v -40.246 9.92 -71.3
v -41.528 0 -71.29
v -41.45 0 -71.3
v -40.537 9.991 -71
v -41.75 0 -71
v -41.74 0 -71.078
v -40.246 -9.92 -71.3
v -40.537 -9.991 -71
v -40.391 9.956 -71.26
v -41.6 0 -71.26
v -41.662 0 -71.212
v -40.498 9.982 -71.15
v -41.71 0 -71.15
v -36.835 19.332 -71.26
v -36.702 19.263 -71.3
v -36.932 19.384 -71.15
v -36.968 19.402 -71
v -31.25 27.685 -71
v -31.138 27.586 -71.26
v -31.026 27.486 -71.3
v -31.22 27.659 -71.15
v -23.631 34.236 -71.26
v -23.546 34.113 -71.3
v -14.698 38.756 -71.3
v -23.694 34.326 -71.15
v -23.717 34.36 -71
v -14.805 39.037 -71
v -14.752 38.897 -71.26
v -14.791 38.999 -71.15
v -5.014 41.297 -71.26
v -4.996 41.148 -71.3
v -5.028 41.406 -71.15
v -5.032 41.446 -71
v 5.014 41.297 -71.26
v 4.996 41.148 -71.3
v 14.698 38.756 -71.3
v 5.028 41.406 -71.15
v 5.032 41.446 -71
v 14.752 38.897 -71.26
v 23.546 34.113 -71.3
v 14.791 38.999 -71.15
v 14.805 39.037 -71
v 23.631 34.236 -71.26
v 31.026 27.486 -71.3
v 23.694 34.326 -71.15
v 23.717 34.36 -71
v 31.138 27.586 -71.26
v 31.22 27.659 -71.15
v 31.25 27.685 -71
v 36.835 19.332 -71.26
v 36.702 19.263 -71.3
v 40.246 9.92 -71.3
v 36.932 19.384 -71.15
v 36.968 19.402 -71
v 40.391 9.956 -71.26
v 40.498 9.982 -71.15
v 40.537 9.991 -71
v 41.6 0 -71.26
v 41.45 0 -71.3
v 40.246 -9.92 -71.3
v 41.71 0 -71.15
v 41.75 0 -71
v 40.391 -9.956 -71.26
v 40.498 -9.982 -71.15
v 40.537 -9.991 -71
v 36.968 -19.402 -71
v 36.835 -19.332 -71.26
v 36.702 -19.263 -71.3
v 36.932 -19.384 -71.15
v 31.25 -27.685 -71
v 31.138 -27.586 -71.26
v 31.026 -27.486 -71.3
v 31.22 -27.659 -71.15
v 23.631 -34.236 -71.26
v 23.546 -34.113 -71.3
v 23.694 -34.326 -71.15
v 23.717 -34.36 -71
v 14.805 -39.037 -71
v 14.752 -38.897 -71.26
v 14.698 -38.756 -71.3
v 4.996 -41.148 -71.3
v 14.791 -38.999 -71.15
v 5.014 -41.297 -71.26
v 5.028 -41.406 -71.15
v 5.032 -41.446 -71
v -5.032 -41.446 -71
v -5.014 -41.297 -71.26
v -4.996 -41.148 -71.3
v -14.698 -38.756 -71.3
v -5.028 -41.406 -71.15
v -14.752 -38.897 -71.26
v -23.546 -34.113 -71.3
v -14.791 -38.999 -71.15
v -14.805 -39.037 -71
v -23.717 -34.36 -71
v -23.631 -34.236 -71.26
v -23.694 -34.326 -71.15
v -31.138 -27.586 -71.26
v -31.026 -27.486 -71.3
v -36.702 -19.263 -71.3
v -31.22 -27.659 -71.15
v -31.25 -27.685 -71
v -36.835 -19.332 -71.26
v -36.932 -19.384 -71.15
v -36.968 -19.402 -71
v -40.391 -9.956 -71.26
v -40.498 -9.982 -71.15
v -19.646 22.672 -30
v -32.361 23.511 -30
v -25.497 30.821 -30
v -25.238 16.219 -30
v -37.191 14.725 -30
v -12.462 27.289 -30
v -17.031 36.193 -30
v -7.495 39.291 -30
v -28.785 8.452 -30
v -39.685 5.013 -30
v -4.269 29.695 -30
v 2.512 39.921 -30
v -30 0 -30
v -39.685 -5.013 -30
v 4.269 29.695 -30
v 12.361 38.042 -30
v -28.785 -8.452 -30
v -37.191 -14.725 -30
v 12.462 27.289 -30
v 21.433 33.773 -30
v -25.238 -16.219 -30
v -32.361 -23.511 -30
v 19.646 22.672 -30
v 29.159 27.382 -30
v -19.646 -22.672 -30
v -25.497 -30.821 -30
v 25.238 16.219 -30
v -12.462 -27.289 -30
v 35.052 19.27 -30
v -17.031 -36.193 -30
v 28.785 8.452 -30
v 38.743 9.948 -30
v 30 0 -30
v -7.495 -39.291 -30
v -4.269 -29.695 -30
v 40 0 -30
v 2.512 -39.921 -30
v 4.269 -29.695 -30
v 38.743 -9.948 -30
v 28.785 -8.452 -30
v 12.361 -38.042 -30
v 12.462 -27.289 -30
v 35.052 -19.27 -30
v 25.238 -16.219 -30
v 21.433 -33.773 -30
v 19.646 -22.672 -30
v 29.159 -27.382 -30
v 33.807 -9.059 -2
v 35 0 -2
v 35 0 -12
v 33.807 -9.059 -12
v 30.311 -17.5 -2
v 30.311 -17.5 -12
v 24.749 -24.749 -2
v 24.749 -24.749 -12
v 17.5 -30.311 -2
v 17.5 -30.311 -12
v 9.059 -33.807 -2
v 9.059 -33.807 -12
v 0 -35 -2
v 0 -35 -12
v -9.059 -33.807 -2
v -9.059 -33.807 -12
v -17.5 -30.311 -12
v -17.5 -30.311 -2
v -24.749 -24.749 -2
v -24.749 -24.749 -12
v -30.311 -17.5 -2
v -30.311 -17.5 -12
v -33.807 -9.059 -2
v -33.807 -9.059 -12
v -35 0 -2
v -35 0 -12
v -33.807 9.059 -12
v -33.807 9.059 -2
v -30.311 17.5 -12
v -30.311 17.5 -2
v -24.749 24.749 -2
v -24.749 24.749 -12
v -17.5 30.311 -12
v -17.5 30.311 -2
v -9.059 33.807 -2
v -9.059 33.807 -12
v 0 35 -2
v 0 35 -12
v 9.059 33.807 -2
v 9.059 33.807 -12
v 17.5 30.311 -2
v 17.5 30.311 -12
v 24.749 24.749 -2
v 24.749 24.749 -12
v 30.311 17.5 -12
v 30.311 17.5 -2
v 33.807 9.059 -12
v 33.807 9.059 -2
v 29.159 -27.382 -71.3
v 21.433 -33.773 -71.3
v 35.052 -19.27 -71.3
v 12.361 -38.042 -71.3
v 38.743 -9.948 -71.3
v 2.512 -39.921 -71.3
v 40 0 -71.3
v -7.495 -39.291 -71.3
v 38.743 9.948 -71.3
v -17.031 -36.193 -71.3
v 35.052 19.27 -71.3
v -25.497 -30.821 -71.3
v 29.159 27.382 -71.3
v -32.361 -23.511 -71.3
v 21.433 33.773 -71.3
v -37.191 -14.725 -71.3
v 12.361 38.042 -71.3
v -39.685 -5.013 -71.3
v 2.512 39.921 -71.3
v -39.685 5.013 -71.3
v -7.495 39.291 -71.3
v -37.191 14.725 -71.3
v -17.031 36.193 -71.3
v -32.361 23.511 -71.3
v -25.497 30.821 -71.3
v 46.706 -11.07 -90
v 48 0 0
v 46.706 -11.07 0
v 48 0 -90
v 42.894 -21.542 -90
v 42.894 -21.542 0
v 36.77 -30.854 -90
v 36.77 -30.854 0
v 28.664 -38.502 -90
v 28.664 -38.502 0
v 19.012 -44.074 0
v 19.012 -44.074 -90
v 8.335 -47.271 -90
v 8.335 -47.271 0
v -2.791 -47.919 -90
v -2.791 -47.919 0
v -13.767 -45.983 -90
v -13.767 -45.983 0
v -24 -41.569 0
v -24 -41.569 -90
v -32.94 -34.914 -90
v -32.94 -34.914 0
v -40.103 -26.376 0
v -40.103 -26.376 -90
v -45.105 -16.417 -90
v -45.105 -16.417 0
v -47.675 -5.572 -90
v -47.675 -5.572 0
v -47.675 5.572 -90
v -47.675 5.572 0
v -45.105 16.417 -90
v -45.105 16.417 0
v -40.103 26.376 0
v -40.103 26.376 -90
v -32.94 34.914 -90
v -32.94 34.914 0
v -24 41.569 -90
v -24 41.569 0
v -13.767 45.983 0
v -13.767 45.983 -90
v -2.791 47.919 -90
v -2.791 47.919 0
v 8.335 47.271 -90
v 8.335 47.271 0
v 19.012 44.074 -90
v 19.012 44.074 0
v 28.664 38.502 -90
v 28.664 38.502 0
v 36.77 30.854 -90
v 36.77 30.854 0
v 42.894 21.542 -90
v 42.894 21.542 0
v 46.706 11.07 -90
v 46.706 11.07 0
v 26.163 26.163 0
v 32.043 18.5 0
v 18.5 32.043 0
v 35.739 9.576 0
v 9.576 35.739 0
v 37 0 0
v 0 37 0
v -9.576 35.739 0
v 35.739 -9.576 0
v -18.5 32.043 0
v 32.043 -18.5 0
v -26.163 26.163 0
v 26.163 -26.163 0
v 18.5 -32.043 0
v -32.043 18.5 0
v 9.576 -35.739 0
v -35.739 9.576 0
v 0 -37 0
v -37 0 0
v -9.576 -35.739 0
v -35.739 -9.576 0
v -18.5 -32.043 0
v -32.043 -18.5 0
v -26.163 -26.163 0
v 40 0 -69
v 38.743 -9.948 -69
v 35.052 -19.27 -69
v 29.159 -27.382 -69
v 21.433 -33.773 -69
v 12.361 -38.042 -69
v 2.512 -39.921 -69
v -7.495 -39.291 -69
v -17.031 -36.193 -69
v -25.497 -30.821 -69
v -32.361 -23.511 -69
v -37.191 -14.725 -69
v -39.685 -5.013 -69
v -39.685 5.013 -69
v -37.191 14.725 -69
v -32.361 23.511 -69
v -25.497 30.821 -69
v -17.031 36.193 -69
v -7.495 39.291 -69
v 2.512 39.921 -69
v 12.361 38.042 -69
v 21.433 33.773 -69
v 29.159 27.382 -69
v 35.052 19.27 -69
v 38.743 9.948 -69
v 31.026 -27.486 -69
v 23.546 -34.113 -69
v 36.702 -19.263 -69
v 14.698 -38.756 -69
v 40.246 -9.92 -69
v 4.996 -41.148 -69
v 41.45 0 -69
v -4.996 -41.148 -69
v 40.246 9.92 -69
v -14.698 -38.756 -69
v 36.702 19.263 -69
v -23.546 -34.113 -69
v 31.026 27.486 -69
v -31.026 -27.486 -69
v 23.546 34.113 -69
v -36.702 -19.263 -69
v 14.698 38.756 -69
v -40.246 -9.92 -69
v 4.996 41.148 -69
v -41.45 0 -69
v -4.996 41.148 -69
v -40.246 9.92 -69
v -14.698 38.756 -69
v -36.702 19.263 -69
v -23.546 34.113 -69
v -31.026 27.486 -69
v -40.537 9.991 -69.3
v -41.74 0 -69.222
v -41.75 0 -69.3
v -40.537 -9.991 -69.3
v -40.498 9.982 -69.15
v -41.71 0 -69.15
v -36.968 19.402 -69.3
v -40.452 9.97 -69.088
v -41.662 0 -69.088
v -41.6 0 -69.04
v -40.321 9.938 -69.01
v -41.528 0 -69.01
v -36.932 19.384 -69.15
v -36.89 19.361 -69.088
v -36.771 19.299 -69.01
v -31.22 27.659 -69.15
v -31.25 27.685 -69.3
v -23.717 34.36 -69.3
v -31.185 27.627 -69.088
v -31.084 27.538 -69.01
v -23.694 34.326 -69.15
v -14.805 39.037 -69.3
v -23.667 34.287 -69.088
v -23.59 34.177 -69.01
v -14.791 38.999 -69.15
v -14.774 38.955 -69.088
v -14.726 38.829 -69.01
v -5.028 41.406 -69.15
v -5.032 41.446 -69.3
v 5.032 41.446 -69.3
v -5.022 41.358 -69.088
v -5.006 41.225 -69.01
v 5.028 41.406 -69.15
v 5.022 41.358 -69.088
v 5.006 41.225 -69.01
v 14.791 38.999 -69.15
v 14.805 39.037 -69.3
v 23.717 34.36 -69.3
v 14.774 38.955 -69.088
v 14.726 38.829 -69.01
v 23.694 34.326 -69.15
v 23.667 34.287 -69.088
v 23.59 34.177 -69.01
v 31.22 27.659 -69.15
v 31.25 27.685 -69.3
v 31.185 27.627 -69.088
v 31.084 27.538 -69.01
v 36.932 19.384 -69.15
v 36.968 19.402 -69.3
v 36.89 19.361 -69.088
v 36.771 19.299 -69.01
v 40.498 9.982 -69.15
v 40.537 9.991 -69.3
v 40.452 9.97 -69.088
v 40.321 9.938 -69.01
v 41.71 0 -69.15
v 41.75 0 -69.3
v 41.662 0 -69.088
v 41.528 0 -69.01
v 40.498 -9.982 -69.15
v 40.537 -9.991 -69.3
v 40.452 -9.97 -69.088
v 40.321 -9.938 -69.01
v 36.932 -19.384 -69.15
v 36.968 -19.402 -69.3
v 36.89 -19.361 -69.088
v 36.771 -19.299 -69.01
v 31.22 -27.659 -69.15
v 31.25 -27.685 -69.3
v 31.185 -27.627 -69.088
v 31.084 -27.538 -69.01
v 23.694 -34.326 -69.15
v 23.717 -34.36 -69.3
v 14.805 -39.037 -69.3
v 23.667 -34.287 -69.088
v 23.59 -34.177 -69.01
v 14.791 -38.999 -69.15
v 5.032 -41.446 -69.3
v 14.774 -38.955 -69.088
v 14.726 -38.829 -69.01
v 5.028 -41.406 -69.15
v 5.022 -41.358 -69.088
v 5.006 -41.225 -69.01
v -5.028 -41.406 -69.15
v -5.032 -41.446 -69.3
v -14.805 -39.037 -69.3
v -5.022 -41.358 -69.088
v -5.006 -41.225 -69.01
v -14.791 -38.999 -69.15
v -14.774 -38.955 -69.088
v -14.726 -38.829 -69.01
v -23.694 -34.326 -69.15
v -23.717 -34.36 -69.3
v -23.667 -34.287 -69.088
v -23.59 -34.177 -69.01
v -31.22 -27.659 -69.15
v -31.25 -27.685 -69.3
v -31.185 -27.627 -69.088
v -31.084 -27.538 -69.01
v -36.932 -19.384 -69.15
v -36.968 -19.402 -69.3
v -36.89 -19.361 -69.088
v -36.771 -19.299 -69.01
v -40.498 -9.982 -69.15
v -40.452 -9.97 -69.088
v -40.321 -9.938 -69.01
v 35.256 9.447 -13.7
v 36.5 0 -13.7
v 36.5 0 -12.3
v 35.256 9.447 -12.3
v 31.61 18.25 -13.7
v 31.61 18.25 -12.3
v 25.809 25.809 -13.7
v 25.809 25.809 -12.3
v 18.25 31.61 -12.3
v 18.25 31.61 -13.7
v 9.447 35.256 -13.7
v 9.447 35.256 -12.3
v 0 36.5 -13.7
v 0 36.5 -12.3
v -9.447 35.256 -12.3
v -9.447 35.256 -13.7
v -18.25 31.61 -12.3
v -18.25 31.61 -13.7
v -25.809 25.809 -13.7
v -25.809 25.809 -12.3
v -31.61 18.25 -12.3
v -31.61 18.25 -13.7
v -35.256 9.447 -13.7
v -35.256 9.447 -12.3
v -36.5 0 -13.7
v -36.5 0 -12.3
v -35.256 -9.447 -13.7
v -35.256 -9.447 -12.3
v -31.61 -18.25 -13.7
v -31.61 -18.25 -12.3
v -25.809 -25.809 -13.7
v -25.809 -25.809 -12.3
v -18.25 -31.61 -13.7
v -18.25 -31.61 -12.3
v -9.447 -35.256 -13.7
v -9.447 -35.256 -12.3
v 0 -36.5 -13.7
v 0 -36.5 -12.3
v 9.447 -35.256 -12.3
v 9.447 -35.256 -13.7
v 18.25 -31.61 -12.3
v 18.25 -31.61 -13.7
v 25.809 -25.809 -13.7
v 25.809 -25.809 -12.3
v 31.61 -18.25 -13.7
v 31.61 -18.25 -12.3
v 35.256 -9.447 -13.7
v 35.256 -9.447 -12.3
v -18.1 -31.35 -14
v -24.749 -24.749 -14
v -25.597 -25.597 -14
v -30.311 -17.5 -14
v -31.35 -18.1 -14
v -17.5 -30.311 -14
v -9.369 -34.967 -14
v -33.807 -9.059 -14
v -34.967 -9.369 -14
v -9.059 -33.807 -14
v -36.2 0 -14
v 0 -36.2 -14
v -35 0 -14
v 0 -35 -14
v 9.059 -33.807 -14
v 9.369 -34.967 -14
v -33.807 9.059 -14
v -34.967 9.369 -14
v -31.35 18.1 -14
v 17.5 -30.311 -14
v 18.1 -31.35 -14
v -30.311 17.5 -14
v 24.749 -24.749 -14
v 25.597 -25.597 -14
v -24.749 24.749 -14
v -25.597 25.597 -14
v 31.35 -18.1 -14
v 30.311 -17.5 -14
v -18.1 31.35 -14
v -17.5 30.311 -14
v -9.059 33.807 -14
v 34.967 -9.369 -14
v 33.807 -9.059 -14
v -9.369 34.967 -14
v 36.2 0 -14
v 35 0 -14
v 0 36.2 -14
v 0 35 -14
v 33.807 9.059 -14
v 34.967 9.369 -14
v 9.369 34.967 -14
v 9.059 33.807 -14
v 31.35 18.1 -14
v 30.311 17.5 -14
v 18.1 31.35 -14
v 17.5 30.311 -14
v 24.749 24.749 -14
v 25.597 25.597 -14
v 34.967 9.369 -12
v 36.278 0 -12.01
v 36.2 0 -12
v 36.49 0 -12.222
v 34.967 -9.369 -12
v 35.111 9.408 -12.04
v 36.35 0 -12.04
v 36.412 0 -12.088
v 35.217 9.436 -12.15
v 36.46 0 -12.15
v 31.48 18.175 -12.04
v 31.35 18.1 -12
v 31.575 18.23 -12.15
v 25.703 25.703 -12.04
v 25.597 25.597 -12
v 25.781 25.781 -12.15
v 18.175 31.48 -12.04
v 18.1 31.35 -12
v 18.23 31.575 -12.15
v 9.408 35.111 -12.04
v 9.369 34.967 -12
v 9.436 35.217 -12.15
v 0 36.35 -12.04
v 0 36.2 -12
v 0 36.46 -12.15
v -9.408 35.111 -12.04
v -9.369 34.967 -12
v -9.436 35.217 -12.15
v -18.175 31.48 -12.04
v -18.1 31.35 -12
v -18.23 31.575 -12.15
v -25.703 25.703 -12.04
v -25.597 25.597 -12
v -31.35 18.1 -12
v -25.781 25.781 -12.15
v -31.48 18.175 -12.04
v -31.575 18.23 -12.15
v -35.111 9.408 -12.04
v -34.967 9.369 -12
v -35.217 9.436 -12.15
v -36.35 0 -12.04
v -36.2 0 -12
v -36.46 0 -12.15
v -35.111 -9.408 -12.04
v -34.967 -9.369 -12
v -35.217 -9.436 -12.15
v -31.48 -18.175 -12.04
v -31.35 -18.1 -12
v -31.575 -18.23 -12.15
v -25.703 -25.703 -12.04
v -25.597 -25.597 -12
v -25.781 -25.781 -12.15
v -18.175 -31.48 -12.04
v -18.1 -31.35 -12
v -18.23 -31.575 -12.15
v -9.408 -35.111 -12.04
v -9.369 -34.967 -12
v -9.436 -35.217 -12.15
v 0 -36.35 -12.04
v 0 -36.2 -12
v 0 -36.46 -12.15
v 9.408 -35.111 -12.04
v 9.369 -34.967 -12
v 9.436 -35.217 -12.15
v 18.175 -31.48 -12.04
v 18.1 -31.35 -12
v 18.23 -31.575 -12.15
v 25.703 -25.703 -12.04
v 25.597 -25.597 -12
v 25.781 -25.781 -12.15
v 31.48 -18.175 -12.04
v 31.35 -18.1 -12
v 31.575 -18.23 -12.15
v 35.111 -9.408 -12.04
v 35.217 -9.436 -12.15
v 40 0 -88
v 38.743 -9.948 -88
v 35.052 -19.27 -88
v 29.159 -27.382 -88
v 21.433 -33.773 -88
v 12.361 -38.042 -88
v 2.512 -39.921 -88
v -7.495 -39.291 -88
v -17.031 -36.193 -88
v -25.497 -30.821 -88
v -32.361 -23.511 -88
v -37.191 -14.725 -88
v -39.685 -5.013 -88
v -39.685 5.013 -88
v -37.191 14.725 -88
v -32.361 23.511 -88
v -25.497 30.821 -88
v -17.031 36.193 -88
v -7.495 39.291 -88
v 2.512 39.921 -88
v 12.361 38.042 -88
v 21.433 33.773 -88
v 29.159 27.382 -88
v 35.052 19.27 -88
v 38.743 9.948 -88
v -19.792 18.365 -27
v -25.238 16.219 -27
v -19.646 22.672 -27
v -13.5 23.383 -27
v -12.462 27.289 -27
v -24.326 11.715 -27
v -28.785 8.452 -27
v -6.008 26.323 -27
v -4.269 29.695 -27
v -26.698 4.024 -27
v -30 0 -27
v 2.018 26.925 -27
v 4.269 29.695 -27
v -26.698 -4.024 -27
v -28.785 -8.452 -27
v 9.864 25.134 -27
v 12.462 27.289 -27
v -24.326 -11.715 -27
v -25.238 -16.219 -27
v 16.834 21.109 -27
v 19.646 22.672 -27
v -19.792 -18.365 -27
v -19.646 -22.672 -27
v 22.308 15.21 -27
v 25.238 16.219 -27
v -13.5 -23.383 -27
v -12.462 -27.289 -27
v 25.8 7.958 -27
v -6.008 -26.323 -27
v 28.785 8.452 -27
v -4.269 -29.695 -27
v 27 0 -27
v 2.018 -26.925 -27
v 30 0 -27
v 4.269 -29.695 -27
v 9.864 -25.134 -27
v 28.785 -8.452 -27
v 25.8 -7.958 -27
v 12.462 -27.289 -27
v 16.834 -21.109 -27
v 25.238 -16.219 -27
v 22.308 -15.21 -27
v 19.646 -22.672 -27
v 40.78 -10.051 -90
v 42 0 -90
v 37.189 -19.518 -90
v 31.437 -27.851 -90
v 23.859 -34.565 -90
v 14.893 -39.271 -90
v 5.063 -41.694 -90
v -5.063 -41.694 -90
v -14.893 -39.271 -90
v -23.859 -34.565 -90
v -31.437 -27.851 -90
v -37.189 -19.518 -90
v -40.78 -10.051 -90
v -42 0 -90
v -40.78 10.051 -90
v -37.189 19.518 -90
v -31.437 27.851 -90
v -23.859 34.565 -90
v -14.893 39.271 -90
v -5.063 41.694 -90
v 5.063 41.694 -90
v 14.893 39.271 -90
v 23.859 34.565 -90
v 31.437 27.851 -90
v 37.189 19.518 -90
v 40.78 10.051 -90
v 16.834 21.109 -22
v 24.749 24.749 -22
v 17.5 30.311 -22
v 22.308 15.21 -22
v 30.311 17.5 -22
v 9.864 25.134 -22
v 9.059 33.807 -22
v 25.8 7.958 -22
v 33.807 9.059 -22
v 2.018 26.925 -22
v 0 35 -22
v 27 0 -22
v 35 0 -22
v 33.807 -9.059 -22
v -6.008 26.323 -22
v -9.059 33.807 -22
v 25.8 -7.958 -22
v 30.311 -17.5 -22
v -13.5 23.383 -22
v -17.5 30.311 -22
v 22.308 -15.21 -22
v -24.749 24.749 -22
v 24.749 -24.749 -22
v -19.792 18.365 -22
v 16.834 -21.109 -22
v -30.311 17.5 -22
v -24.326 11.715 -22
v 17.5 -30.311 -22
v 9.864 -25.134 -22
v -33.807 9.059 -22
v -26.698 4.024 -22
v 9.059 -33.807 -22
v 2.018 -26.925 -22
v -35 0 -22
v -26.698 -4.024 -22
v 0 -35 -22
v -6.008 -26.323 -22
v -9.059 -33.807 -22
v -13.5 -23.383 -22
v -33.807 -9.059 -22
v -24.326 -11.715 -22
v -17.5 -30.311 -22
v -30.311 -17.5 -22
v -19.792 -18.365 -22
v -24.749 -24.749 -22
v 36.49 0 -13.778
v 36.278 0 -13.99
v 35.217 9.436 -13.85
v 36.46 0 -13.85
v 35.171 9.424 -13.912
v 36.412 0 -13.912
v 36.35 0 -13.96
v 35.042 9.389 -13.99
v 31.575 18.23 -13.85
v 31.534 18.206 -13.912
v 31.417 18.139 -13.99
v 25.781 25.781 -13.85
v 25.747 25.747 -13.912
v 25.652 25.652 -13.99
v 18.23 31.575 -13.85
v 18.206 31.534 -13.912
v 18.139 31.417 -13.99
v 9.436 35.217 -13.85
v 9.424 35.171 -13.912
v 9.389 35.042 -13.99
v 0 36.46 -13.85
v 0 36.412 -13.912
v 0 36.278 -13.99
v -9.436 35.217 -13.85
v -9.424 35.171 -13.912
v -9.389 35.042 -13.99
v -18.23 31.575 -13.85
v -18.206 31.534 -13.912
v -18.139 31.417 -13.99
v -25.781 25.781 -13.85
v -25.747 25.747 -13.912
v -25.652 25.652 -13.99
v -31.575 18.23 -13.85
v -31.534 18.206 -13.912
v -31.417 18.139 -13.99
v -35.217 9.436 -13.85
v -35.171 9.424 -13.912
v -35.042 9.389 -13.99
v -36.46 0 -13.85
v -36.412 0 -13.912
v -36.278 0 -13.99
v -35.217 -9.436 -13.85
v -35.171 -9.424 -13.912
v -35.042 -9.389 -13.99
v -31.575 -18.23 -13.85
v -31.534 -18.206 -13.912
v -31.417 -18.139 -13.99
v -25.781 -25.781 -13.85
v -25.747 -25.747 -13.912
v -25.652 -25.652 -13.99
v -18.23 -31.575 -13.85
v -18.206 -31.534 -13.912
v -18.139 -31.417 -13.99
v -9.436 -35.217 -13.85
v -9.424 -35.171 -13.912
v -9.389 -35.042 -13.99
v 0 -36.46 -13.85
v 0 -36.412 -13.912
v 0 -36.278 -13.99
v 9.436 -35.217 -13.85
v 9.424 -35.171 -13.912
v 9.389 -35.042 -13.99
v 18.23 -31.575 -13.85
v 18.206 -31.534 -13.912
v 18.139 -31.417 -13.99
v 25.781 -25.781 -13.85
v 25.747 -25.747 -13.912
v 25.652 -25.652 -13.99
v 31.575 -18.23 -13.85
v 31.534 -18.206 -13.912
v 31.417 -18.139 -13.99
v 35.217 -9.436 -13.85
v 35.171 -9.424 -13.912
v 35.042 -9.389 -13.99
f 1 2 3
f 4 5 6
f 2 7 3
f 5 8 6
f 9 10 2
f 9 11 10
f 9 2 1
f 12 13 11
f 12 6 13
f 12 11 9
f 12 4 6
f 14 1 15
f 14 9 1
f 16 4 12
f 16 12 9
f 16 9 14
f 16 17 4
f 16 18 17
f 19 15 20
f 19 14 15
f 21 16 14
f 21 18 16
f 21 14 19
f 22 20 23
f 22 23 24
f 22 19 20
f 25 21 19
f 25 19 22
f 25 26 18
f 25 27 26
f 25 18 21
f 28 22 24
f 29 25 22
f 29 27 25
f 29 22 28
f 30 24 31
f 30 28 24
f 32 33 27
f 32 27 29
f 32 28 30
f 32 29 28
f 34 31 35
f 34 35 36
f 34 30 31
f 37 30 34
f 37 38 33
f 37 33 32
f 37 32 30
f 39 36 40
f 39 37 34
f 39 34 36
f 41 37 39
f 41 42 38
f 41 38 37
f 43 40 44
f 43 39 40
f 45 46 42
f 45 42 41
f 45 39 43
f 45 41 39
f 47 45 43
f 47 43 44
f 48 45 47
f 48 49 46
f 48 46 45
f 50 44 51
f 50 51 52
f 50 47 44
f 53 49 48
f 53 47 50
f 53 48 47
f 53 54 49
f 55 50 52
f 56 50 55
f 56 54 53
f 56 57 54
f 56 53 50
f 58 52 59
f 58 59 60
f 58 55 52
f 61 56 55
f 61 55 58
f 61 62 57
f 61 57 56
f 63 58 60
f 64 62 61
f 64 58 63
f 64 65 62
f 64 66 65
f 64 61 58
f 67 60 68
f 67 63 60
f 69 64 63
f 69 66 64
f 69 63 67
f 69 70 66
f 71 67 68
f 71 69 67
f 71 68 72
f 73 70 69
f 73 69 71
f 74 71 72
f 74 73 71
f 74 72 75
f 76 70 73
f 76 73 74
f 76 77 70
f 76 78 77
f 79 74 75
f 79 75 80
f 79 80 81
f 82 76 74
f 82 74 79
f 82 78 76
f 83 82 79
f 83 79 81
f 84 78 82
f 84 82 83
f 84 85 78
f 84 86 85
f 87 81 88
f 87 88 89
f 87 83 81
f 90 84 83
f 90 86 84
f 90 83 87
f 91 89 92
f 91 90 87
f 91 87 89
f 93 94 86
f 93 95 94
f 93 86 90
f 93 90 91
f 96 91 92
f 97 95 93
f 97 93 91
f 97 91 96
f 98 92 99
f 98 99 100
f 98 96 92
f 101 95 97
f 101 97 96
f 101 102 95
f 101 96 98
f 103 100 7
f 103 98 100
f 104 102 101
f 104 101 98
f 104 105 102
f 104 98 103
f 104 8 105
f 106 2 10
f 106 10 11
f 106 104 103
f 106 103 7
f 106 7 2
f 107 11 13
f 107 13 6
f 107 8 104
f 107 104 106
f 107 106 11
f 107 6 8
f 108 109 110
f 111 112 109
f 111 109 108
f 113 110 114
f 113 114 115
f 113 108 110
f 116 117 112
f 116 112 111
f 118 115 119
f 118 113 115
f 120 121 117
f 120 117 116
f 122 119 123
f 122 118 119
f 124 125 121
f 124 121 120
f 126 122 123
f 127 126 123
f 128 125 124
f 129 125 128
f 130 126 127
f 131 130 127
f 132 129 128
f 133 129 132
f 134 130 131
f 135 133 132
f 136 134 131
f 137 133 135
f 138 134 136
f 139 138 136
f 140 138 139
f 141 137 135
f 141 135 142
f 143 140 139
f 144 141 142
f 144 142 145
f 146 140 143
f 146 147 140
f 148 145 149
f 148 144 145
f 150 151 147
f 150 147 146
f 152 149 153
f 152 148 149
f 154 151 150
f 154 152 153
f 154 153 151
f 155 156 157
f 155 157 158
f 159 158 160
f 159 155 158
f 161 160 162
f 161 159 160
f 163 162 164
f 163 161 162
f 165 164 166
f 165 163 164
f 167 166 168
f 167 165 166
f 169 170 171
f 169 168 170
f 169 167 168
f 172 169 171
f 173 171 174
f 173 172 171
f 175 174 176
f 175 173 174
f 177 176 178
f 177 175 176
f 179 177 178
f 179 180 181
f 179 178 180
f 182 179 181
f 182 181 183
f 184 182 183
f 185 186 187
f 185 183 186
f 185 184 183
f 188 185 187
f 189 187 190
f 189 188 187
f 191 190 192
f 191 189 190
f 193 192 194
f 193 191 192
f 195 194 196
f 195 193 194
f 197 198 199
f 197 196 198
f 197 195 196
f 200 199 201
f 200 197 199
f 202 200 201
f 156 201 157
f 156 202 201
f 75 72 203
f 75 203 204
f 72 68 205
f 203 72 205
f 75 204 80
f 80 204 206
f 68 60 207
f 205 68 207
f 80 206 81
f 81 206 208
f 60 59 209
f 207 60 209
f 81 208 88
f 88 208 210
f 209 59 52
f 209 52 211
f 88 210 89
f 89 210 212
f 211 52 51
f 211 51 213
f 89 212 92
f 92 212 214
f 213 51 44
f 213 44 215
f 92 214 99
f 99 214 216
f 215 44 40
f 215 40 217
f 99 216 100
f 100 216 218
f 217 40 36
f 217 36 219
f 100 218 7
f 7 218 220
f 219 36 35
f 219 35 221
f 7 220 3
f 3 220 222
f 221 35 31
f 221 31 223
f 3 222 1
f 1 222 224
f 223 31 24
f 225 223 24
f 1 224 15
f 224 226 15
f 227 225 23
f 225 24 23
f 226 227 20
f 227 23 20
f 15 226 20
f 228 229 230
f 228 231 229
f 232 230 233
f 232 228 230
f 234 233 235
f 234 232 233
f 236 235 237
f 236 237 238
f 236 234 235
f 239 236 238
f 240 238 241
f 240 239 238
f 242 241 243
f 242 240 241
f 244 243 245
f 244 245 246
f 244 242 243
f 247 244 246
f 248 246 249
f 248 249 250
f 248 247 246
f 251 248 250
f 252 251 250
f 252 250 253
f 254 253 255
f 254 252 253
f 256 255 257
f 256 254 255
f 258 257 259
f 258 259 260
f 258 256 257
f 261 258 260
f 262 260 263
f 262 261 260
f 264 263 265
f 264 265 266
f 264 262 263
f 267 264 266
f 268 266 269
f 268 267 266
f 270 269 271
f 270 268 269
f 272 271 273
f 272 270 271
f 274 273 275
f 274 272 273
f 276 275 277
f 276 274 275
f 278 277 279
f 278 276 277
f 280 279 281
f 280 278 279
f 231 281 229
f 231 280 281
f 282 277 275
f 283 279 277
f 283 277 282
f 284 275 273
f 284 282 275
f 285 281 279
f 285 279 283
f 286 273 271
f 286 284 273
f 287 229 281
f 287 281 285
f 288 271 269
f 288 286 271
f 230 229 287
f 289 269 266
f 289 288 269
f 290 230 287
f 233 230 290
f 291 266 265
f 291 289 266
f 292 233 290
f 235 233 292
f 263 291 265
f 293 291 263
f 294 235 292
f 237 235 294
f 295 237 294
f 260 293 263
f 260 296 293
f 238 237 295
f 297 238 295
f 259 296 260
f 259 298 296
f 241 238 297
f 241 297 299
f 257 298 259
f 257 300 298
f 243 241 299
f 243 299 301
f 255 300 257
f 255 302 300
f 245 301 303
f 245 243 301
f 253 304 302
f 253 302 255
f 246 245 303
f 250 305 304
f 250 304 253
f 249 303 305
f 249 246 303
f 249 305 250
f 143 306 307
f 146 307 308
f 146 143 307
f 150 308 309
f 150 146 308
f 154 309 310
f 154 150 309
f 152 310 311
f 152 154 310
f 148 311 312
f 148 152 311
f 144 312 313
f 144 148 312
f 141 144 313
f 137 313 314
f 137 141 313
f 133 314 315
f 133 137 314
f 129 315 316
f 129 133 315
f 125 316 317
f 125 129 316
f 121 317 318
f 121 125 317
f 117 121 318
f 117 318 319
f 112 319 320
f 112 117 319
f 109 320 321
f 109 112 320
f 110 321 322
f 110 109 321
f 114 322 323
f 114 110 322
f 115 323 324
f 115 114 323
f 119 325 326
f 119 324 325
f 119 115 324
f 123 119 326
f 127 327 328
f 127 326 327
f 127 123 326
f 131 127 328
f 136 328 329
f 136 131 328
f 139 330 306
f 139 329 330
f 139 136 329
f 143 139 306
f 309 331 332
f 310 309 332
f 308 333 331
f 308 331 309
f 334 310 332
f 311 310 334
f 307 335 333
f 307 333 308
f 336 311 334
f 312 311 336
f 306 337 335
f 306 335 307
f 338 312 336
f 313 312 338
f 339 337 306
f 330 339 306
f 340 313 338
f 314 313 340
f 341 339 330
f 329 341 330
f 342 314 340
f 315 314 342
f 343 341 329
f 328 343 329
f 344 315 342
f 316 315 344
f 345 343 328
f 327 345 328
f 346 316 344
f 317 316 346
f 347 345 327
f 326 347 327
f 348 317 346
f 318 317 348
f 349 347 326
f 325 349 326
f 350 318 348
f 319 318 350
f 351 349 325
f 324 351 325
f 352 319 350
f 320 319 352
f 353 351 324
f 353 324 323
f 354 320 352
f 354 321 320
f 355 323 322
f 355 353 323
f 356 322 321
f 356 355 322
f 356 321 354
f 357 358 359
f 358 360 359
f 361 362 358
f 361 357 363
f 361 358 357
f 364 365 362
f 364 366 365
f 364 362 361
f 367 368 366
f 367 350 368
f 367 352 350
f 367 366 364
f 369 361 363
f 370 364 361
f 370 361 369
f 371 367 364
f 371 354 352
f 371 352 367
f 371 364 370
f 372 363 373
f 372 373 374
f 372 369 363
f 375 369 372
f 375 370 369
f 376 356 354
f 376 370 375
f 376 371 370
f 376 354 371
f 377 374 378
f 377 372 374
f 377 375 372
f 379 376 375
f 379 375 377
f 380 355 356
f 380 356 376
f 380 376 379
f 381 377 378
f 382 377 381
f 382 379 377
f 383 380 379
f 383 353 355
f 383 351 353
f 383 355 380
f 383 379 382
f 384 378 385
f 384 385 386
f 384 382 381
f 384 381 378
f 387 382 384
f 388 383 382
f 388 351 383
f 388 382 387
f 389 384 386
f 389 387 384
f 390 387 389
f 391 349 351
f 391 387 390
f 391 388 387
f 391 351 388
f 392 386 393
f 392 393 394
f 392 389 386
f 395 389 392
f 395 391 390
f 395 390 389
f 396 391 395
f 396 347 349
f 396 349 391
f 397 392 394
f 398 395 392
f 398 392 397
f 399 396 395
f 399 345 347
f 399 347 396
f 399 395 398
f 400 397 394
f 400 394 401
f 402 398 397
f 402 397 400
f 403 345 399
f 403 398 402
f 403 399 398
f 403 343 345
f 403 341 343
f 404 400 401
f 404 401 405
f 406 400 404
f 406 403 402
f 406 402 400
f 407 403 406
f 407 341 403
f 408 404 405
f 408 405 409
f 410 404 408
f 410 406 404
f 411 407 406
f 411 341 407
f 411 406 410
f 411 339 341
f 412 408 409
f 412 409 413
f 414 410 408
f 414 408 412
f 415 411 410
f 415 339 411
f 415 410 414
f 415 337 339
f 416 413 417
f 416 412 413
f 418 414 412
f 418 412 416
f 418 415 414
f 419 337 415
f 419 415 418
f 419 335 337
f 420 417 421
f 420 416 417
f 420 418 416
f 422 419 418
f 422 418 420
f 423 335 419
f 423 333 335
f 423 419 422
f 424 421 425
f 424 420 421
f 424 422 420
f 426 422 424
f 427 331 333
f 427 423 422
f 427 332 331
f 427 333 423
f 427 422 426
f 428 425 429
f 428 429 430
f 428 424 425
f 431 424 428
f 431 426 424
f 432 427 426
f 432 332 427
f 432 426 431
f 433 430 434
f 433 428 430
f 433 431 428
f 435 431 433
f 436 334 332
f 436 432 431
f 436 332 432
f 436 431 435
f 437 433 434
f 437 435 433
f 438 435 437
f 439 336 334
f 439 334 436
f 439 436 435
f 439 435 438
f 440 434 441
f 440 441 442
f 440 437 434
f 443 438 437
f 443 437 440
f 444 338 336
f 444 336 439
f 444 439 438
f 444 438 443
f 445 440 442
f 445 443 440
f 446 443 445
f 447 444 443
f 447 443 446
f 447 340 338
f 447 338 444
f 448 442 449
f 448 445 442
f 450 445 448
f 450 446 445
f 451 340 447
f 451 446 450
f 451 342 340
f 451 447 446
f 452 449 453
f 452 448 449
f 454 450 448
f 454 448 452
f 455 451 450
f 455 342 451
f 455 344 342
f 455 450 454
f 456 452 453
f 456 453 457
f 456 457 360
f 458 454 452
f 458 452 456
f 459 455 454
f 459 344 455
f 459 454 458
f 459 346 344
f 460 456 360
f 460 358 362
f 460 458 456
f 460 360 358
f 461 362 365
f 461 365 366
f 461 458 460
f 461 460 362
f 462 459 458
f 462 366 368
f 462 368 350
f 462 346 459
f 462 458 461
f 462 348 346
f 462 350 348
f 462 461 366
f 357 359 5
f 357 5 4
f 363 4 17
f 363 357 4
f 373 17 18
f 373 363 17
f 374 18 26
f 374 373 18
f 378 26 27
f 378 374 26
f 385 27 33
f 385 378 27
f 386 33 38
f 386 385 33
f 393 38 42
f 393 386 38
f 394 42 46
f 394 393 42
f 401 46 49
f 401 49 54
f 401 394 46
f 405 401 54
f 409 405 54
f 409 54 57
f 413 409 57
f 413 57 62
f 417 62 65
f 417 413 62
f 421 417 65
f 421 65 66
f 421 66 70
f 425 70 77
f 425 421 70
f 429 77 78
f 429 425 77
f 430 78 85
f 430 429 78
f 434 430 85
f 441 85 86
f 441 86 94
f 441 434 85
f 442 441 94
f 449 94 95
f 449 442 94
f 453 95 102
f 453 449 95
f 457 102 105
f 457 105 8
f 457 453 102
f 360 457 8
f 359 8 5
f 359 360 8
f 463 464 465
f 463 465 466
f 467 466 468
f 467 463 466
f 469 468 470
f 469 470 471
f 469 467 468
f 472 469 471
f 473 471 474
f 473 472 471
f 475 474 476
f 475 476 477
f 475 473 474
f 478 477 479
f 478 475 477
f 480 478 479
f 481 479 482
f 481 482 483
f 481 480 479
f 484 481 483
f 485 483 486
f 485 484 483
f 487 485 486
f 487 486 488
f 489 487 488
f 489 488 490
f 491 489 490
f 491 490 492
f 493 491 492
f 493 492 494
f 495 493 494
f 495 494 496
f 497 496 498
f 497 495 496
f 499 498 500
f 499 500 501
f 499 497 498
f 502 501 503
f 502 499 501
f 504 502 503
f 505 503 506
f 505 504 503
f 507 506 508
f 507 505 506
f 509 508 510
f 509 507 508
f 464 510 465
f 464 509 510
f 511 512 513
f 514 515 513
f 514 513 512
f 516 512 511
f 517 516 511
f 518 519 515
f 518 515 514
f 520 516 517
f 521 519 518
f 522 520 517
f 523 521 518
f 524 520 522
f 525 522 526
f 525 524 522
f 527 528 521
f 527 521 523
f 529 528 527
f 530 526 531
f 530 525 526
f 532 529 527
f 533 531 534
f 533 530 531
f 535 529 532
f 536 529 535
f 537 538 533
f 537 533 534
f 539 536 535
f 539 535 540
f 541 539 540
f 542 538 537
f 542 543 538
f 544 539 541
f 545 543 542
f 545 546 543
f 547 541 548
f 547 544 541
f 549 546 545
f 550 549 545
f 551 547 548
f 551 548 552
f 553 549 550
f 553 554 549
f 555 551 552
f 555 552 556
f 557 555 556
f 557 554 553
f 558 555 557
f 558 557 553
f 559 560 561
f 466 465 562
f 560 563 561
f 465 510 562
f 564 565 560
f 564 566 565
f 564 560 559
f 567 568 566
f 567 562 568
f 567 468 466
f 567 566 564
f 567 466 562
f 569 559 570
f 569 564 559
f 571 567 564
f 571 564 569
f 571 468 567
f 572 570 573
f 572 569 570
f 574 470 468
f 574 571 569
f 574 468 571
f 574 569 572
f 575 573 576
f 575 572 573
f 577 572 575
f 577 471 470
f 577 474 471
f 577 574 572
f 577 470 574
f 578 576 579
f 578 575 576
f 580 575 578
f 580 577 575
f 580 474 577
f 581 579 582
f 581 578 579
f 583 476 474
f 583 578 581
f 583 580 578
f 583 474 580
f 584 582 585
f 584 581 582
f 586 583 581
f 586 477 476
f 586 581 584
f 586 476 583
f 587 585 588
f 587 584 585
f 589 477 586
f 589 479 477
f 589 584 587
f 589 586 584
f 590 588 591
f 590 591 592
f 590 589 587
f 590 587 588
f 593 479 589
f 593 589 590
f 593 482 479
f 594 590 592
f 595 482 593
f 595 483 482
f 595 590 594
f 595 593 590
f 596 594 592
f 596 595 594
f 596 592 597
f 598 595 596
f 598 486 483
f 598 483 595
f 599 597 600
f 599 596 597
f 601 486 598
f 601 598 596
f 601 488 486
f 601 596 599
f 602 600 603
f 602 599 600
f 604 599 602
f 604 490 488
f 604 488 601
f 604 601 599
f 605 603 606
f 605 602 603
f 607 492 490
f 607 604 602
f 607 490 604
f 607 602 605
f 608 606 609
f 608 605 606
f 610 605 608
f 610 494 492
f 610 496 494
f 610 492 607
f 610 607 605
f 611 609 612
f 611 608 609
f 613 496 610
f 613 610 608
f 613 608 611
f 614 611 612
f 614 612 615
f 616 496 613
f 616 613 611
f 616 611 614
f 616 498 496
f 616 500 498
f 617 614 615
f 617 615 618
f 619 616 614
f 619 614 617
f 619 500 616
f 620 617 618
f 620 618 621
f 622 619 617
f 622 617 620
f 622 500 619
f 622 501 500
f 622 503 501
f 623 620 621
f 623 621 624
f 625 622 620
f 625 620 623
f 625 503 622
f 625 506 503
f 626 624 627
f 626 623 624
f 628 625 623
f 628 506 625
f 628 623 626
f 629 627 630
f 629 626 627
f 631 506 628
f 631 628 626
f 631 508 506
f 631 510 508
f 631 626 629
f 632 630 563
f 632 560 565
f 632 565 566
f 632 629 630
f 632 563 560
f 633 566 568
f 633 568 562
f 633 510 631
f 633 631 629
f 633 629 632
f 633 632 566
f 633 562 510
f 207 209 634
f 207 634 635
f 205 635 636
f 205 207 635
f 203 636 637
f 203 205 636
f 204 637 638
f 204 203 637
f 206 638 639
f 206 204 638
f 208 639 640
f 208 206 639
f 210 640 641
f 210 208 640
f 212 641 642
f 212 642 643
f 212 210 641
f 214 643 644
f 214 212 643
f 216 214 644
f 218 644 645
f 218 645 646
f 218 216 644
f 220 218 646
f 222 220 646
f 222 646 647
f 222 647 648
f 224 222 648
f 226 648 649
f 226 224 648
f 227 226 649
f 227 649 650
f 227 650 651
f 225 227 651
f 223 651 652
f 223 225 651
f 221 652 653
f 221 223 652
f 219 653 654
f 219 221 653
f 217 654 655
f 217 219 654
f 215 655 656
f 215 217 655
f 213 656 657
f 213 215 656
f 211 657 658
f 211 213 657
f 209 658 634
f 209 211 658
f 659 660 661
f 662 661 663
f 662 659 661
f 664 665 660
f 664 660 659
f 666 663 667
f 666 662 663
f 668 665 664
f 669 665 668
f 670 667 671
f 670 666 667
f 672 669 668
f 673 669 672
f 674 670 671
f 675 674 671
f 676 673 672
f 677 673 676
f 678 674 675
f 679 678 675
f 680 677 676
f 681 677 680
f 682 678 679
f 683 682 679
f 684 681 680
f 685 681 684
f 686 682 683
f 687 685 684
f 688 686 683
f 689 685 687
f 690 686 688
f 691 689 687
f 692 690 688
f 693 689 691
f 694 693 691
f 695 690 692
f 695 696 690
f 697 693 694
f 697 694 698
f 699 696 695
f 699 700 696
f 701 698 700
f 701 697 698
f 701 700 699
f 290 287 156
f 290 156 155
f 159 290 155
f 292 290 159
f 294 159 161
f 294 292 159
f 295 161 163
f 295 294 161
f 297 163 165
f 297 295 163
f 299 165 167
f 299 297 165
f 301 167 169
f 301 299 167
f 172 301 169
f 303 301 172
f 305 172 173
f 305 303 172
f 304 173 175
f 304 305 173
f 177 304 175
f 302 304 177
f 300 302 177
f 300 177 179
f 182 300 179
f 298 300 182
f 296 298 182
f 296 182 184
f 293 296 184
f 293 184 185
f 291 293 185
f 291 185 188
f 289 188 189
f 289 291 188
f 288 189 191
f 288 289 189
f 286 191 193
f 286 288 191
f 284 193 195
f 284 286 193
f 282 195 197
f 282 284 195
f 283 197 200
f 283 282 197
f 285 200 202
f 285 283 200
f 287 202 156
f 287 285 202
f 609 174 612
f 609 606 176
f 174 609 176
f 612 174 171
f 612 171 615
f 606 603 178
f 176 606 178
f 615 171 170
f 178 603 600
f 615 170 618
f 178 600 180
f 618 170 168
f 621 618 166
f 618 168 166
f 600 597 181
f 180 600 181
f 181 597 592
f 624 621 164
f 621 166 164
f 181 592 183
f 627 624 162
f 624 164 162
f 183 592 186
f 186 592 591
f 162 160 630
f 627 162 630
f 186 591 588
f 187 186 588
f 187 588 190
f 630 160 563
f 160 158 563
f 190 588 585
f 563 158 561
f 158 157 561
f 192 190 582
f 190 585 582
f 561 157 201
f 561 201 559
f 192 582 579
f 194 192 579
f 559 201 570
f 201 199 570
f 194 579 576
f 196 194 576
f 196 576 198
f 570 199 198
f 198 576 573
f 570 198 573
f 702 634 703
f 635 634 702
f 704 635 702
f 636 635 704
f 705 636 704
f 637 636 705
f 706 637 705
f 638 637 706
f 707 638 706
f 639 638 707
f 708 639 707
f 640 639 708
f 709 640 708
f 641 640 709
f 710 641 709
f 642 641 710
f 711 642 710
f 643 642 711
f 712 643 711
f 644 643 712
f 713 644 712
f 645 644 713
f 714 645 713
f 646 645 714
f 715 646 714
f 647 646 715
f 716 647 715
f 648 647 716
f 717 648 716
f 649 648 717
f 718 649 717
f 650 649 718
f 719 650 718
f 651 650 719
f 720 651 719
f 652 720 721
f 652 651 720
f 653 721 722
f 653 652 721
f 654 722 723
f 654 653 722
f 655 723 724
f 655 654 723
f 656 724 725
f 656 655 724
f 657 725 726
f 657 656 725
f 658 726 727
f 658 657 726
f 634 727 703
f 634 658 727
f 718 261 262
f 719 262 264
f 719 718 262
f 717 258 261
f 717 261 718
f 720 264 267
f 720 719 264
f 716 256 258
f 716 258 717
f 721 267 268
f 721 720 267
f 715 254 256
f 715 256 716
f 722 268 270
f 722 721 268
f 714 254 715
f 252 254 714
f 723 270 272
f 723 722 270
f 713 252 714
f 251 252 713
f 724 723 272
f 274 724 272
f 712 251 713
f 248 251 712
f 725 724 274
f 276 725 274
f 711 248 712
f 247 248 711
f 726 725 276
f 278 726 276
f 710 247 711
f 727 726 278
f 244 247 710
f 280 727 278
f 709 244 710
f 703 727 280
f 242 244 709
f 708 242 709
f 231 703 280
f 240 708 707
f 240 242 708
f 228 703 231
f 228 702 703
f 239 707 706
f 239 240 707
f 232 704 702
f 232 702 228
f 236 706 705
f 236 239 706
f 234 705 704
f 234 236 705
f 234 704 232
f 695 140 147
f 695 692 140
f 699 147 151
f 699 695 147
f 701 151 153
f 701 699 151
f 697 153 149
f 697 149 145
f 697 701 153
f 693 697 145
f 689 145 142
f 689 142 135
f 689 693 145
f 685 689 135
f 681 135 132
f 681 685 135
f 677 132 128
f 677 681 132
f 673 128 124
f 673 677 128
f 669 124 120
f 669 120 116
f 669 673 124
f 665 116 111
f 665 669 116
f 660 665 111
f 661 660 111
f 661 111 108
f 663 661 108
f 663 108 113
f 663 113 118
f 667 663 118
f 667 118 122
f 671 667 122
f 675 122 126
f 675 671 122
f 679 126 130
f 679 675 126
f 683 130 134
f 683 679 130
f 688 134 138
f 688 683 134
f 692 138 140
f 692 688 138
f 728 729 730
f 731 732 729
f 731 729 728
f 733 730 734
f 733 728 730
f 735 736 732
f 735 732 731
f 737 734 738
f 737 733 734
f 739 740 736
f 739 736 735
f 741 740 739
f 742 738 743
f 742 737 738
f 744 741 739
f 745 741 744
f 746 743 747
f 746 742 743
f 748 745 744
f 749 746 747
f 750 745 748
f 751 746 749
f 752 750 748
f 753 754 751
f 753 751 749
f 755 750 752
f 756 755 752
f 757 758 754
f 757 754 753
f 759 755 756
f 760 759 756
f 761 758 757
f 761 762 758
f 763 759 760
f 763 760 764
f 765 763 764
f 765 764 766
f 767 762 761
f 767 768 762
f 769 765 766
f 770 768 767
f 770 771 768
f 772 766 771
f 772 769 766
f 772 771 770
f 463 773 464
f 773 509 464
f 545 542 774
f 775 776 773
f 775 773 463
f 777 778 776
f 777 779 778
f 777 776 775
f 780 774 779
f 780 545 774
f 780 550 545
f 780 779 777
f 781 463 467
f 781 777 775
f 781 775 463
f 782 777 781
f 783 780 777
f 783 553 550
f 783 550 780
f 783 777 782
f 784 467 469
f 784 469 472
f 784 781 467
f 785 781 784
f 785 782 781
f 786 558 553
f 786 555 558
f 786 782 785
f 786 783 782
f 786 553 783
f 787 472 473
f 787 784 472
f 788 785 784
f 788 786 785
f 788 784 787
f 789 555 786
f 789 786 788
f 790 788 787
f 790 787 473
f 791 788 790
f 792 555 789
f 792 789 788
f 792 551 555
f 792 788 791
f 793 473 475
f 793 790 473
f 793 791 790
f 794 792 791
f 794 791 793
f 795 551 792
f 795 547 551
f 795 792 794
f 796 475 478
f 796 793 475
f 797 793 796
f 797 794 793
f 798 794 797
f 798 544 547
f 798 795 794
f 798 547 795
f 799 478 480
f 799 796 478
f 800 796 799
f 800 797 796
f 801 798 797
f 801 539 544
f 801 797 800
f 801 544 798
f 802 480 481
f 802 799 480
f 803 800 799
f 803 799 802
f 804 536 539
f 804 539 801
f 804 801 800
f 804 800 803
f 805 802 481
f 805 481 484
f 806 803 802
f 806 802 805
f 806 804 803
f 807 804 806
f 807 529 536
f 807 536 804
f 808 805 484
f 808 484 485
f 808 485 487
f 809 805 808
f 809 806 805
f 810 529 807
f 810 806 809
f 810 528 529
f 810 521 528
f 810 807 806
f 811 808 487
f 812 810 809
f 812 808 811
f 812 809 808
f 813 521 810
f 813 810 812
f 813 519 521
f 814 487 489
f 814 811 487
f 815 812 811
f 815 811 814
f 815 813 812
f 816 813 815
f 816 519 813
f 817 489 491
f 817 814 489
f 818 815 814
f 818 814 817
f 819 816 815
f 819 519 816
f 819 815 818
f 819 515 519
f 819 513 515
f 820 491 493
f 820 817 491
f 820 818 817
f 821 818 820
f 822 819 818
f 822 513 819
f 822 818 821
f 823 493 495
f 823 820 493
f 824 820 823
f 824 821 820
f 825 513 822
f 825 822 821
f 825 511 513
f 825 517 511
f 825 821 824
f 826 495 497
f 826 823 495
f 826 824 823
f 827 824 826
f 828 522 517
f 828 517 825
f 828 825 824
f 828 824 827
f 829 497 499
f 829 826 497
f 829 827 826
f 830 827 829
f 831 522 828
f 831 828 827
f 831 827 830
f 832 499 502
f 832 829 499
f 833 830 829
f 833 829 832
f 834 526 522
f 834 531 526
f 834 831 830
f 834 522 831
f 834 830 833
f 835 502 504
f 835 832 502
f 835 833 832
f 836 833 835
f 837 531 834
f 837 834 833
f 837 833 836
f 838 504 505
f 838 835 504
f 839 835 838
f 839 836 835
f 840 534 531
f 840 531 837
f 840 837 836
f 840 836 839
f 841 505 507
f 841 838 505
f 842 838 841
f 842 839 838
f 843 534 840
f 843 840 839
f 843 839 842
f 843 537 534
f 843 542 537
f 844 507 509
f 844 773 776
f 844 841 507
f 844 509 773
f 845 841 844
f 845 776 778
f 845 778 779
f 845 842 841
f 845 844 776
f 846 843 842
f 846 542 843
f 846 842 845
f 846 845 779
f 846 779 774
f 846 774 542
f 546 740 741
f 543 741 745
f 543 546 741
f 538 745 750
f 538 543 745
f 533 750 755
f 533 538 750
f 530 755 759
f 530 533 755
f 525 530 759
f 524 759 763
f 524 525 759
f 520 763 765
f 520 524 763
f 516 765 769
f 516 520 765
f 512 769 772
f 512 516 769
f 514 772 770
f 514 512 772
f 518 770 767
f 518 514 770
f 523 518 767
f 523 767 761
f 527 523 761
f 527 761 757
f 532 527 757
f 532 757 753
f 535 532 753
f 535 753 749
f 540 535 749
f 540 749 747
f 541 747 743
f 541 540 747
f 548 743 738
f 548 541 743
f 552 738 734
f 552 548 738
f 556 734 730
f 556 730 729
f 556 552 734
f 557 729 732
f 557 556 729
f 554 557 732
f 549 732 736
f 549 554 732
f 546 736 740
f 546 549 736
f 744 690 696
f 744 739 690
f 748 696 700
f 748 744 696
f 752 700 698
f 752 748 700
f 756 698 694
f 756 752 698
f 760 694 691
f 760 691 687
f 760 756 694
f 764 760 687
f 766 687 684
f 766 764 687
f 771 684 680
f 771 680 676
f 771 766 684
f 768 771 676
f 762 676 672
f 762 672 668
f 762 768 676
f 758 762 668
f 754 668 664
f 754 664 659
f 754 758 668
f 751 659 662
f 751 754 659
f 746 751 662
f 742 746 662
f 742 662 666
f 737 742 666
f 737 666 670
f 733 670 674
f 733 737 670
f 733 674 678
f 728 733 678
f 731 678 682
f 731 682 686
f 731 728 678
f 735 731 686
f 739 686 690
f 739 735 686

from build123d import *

# Parameters (mm, degrees)
SKETCH_2_R          = 36.5
CUT_EXTRUDE_1_DEPTH = 2
SKETCH_3_R          = 41.75
CUT_EXTRUDE_2_DEPTH = 2.3
FILLET_1_R          = 0.3
CHAMFER_2_SIZE      = 2


with BuildPart() as part:
    # Эскиз1 → Повернуть1 (revolve)
    with BuildSketch(Plane(origin=(0, 0, 0), x_dir=(0, 0, -1), z_dir=(1, 0, 0))):
        Polygon((0, 48), (90, 48), (90, 40), (30, 40), (30, 30), (27, 30), (27, 27), (22, 27), (22, 35), (0, 35), align=None)
    revolve(axis=Axis((0, 0, 0), (0, 0, -1)))

    # Эскиз2 → Вырез-Вытянуть1 (cut)
    with BuildSketch(Plane.XY.offset(-14)):
        Circle(SKETCH_2_R)
    extrude(amount=CUT_EXTRUDE_1_DEPTH, mode=Mode.SUBTRACT)

    # Эскиз3 → Вырез-Вытянуть2 (cut)
    with BuildSketch(Plane(origin=(0, 0, -69), x_dir=(-1, 0, 0), z_dir=(0, 0, -1))):
        Circle(SKETCH_3_R)
    extrude(amount=CUT_EXTRUDE_2_DEPTH, mode=Mode.SUBTRACT)

    # Скругление1
    fillet_1_edges = [part.edges().sort_by_distance(p)[0] for p in [
        (41.75, 0, -71.3),
        (41.75, 0, -69),
        (-36.5, 0, -12),
        (-36.5, 0, -14),
    ]]
    fillet(fillet_1_edges, radius=FILLET_1_R)

    # Фаска2
    chamfer_2_edges = [part.edges().sort_by_distance(p)[0] for p in [
        (0, -35, 0),
        (0, -40, -90),
    ]]
    chamfer(chamfer_2_edges, length=CHAMFER_2_SIZE)


solid = part.part
